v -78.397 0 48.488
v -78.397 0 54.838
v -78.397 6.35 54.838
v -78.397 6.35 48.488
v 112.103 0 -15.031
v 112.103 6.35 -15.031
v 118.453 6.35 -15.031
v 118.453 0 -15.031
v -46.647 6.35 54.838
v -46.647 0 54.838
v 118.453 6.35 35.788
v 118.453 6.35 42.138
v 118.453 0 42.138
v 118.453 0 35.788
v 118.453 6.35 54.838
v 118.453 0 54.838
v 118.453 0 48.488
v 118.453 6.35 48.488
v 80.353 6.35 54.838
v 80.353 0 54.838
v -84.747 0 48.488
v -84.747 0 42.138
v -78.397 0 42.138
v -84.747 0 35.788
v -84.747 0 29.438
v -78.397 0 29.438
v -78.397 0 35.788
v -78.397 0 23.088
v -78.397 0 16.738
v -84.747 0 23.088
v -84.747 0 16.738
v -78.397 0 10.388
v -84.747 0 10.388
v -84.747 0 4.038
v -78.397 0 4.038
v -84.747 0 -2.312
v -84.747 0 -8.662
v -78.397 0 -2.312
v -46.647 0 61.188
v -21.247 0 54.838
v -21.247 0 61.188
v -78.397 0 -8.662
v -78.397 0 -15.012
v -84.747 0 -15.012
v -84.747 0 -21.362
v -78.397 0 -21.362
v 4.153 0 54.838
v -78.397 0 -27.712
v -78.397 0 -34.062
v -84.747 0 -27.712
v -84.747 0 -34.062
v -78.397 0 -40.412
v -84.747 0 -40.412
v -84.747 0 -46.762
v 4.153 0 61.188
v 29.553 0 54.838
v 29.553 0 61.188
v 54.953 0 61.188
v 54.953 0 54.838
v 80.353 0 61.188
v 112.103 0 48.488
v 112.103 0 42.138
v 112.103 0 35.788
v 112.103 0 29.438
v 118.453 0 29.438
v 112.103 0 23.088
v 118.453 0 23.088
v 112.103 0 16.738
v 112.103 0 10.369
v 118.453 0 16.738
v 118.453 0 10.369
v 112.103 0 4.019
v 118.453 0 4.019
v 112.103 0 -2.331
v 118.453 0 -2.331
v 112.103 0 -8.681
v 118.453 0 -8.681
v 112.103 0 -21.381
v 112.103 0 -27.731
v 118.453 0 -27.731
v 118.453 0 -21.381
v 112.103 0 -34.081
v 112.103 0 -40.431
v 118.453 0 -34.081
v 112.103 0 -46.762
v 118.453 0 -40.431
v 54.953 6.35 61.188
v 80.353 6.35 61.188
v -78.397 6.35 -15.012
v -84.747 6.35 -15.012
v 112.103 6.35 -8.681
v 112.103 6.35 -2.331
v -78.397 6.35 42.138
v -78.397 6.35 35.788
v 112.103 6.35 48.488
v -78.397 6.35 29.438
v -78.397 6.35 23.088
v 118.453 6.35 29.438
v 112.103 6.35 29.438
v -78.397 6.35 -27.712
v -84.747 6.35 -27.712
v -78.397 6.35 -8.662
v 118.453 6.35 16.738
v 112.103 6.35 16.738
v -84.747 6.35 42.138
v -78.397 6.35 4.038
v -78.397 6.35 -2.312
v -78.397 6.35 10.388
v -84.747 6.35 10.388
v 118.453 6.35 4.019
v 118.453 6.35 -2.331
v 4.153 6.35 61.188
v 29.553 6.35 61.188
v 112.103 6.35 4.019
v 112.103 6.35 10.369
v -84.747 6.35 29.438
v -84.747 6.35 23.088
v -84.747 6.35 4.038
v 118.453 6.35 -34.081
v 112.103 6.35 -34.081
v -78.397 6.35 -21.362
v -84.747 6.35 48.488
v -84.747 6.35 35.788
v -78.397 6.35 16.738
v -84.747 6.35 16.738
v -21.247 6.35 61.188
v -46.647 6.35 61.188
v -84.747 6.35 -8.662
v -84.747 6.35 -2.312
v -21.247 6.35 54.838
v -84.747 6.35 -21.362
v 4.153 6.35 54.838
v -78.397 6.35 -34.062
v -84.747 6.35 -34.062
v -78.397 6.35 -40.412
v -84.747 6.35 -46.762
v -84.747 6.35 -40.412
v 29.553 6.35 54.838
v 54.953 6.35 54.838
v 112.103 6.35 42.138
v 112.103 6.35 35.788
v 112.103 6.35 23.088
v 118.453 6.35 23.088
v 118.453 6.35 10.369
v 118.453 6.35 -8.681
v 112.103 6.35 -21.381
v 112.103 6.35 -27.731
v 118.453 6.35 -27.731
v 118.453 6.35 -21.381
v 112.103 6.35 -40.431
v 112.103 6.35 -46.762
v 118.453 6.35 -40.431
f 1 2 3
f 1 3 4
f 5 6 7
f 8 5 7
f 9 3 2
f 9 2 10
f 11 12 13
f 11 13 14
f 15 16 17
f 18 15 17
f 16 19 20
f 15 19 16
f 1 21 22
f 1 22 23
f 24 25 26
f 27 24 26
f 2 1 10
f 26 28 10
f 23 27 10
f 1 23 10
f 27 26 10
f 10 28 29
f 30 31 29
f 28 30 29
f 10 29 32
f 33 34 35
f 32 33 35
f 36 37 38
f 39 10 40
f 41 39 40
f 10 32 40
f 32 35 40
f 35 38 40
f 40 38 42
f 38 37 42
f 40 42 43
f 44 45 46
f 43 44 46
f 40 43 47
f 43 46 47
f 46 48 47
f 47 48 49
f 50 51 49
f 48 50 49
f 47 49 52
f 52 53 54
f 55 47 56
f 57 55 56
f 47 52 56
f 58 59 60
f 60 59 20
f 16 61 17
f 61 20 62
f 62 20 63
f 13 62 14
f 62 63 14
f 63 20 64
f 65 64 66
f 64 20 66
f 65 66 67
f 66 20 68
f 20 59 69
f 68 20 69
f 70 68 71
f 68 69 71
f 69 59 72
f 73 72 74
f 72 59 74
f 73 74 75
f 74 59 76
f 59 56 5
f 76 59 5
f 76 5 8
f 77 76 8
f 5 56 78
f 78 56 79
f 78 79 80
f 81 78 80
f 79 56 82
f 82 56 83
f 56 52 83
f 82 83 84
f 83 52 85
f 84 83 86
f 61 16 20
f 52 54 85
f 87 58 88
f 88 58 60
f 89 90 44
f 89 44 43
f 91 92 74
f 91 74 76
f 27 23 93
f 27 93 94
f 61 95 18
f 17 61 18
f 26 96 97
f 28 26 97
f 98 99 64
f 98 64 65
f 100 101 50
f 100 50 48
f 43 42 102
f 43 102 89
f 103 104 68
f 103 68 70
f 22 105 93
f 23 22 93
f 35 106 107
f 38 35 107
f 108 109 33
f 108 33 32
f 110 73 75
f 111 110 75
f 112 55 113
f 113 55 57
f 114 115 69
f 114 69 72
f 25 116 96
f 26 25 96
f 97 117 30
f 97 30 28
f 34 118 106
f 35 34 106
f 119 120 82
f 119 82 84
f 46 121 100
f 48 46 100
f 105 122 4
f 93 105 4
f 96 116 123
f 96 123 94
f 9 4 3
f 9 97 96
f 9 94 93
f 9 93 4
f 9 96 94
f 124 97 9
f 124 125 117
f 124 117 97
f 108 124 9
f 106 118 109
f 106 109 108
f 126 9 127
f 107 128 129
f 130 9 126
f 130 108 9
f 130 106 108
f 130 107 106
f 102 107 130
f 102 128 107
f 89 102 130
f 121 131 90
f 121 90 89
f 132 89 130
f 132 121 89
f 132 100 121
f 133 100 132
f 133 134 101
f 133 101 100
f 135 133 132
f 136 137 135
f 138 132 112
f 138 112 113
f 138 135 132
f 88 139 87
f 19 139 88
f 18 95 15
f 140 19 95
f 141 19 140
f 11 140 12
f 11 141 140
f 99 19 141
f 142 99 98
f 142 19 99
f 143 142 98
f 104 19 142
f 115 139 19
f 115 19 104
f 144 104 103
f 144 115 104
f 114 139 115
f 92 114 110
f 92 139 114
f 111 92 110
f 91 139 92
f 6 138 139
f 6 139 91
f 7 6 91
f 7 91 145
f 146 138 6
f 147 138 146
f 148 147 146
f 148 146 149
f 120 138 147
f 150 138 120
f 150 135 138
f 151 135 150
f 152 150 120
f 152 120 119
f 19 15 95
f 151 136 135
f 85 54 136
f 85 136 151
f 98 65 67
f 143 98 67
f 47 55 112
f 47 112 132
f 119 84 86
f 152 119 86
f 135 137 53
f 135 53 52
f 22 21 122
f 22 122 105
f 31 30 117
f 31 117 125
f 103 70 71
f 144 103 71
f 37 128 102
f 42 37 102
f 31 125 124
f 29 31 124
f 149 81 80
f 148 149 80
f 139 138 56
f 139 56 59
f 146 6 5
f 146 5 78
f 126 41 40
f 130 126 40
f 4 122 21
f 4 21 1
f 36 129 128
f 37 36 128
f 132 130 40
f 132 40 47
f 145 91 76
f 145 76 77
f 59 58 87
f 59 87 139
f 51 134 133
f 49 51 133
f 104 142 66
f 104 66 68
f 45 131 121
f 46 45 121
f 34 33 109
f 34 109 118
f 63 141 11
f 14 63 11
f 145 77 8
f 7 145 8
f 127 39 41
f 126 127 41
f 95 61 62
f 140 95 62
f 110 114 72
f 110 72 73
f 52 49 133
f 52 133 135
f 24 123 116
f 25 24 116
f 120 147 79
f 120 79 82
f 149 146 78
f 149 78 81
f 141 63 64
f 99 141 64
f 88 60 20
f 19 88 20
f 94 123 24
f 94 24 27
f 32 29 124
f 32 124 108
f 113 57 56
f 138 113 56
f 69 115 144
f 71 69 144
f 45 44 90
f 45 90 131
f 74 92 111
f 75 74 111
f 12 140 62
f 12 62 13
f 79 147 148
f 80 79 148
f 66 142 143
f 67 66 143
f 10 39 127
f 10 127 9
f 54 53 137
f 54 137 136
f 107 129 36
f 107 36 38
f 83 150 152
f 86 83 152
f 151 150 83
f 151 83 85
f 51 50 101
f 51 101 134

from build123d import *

# Parameters (mm, degrees)
SKETCH1_W           = 203.2
SKETCH1_H           = 107.95
BOSS_EXTRUDE1_DEPTH = 6.35
SKETCH2_W           = 38.1
SKETCH2_H           = 6.35
SKETCH2_W_2         = 25.4
CUT_EXTRUDE1_DEPTH  = 7.35
SKETCH3_W           = 6.35
SKETCH3_H           = 6.35
CUT_EXTRUDE2_DEPTH  = 7.35


with BuildPart() as part:
    # Sketch1 → Boss-Extrude1 (new body)
    with BuildSketch(Plane(origin=(0, 0, 0), x_dir=(1, 0, 0), z_dir=(0, 1, 0))):
        with Locations((16.852621149, -7.21321811)):
            Rectangle(SKETCH1_W, SKETCH1_H)
    extrude(amount=BOSS_EXTRUDE1_DEPTH)

    # Sketch2 → Cut-Extrude1 (cut, through all)
    with BuildSketch(Plane(origin=(0, 6.35, 0), x_dir=(1, 0, 0), z_dir=(0, 1, 0))):
        with Locations((99.402621149, -58.01321811)):
            Rectangle(SKETCH2_W, SKETCH2_H)
        with Locations((42.252621149, -58.01321811)):
            Rectangle(SKETCH2_W_2, SKETCH2_H)
        with Locations((-8.547378851, -58.01321811)):
            Rectangle(SKETCH2_W_2, SKETCH2_H)
        with Locations((-65.697378851, -58.01321811)):
            Rectangle(SKETCH2_W, SKETCH2_H)
    extrude(amount=-CUT_EXTRUDE1_DEPTH, mode=Mode.SUBTRACT)

    # Sketch3 → Cut-Extrude2 (cut, through all)
    with BuildSketch(Plane(origin=(0, 6.35, 0), x_dir=(1, 0, 0), z_dir=(0, 1, 0))):
        with Locations((115.277621149, -45.31321811)):
            Rectangle(SKETCH3_W, SKETCH3_H)
        with Locations((115.277621149, -32.61321811)):
            Rectangle(SKETCH3_W, SKETCH3_H)
        with Locations((115.277621149, -19.91321811)):
            Rectangle(SKETCH3_W, SKETCH3_H)
        with Locations((115.277621149, -7.194250827)):
            Rectangle(SKETCH3_W, SKETCH3_H)
        with Locations((115.277621149, 5.505749173)):
            Rectangle(SKETCH3_W, SKETCH3_H)
        with Locations((115.277621149, 18.205749173)):
            Rectangle(SKETCH3_W, SKETCH3_H)
        with Locations((115.277621149, 30.905749173)):
            Rectangle(SKETCH3_W, SKETCH3_H)
        with Locations((115.277621149, 43.605749173)):
            Rectangle(SKETCH3_W, SKETCH3_H)
        with Locations((-81.572378851, -51.66321811)):
            Rectangle(SKETCH3_W, SKETCH3_H)
        with Locations((-81.572378851, -38.96321811)):
            Rectangle(SKETCH3_W, SKETCH3_H)
        with Locations((-81.572378851, -26.26321811)):
            Rectangle(SKETCH3_W, SKETCH3_H)
        with Locations((-81.572378851, -13.56321811)):
            Rectangle(SKETCH3_W, SKETCH3_H)
        with Locations((-81.572378851, -0.86321811)):
            Rectangle(SKETCH3_W, SKETCH3_H)
        with Locations((-81.572378851, 11.83678189)):
            Rectangle(SKETCH3_W, SKETCH3_H)
        with Locations((-81.572378851, 24.53678189)):
            Rectangle(SKETCH3_W, SKETCH3_H)
        with Locations((-81.572378851, 37.23678189)):
            Rectangle(SKETCH3_W, SKETCH3_H)
    extrude(amount=-CUT_EXTRUDE2_DEPTH, mode=Mode.SUBTRACT)


solid = part.part
